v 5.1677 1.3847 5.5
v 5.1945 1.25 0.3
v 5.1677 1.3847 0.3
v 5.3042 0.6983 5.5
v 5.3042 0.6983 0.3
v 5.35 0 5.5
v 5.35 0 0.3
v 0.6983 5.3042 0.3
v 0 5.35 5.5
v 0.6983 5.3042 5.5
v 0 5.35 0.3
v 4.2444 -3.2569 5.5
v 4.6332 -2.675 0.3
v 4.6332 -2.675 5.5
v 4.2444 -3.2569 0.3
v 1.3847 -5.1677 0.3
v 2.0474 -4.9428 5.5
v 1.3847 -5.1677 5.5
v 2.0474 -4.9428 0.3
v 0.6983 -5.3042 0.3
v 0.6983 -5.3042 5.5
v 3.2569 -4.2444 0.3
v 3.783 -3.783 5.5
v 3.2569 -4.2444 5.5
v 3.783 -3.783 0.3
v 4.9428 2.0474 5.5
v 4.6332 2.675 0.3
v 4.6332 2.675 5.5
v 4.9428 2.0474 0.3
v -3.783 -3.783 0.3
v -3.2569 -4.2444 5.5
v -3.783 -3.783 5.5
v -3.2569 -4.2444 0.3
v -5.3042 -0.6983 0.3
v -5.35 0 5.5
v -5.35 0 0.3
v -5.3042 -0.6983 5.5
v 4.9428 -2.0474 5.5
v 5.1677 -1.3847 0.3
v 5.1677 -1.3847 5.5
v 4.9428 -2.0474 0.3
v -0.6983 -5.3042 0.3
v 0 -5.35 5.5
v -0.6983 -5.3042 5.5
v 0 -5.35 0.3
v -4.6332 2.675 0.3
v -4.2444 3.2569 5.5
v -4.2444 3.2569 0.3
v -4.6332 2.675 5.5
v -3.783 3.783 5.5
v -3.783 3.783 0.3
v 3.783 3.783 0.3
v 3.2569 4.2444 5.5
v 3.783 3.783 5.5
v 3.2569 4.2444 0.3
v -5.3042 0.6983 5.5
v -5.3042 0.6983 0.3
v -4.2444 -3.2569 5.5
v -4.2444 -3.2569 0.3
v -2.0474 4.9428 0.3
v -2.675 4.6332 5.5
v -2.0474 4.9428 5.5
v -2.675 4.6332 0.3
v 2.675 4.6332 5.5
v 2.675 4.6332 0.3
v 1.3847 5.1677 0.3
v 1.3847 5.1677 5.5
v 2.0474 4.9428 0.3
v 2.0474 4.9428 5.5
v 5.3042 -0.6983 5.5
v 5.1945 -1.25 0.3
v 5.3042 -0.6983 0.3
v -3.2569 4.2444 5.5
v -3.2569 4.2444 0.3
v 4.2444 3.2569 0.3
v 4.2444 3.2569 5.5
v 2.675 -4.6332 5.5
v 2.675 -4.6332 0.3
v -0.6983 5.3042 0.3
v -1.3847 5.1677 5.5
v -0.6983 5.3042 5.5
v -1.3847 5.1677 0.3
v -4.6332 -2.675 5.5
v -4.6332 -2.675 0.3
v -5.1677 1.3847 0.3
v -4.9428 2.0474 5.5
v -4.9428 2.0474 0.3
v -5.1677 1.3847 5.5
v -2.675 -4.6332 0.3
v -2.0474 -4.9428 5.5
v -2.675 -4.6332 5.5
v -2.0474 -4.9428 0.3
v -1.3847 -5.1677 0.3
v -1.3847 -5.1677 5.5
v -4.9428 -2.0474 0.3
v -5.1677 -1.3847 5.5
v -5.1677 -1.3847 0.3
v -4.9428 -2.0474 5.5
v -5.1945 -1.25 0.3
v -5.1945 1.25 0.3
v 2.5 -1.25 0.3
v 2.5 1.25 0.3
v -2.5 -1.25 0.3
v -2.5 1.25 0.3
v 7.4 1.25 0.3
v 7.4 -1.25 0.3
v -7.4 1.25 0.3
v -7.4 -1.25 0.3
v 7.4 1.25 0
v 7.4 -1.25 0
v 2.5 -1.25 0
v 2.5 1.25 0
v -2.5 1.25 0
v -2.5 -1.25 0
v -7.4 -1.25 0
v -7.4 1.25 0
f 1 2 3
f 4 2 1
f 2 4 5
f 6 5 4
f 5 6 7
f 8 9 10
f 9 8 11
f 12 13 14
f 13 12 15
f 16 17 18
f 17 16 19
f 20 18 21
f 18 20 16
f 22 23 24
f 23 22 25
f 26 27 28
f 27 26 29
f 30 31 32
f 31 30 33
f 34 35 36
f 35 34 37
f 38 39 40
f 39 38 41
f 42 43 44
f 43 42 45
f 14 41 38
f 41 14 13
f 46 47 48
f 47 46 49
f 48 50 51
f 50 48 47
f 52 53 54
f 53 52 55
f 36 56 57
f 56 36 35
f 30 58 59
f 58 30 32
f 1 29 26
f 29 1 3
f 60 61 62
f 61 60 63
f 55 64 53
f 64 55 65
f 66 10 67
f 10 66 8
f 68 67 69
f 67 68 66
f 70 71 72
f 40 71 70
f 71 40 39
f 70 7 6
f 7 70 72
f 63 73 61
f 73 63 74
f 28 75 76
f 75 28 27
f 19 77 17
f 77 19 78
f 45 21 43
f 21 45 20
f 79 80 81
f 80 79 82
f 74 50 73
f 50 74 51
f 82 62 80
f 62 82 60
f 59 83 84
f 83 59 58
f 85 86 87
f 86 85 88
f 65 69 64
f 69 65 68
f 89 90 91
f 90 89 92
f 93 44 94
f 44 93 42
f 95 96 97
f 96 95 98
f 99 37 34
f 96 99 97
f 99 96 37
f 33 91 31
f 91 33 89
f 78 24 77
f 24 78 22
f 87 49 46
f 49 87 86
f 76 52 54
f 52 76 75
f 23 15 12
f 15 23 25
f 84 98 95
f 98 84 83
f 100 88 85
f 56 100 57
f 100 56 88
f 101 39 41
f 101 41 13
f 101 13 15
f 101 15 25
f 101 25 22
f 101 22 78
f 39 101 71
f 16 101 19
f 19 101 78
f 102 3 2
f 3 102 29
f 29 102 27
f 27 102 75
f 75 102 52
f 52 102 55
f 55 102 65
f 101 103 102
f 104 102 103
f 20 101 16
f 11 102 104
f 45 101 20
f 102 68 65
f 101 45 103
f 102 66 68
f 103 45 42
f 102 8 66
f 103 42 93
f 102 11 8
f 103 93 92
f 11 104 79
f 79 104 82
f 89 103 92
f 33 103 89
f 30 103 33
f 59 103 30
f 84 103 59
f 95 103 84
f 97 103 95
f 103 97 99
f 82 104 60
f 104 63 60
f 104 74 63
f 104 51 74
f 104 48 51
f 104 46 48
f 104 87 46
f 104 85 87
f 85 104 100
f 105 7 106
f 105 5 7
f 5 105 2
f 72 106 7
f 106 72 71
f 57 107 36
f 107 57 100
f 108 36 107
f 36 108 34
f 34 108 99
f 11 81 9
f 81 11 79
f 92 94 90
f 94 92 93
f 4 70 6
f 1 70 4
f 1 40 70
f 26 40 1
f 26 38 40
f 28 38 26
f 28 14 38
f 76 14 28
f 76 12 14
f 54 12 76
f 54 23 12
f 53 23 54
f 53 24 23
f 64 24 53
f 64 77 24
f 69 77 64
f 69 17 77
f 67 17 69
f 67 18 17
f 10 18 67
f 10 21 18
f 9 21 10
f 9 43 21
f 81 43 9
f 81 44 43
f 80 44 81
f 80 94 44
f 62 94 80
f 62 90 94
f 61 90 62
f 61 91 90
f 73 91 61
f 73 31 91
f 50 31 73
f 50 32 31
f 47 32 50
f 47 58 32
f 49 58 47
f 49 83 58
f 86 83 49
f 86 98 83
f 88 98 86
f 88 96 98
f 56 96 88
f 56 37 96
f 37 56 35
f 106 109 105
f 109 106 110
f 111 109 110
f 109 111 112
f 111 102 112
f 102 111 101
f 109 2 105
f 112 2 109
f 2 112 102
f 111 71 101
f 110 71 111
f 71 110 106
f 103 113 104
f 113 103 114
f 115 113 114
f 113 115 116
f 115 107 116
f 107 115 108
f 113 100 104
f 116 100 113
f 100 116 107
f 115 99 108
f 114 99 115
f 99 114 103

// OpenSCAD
// KEMET FC/FCS series supercapacitor, 10.7 mm diameter SMD can, 5.5 mm high.
// Optional part on this board - fitted only when GNSS hot start is wanted.
//
// Perimeter only: the can and its two gull-wing terminals as plain solids.
// Authored in KiCad 3D model space (Y is the footprint's Y negated, Z is
// height above the board).

$fn = 48;

CAN_D = 10.7;
CAN_H = 5.5;
STANDOFF = 0.3;   // terminal thickness under the can
TERM_W = 4.9;     // land width
TERM_L = 2.5;
TERM_X = 4.95;    // land centre, matches the footprint

module can() {
    translate([0, 0, STANDOFF])
        cylinder(d = CAN_D, h = CAN_H - STANDOFF);
}

module terminal(sign) {
    translate([sign * TERM_X - TERM_W / 2, -TERM_L / 2, 0])
        cube([TERM_W, TERM_L, STANDOFF]);
}

can();
terminal(1);
terminal(-1);
